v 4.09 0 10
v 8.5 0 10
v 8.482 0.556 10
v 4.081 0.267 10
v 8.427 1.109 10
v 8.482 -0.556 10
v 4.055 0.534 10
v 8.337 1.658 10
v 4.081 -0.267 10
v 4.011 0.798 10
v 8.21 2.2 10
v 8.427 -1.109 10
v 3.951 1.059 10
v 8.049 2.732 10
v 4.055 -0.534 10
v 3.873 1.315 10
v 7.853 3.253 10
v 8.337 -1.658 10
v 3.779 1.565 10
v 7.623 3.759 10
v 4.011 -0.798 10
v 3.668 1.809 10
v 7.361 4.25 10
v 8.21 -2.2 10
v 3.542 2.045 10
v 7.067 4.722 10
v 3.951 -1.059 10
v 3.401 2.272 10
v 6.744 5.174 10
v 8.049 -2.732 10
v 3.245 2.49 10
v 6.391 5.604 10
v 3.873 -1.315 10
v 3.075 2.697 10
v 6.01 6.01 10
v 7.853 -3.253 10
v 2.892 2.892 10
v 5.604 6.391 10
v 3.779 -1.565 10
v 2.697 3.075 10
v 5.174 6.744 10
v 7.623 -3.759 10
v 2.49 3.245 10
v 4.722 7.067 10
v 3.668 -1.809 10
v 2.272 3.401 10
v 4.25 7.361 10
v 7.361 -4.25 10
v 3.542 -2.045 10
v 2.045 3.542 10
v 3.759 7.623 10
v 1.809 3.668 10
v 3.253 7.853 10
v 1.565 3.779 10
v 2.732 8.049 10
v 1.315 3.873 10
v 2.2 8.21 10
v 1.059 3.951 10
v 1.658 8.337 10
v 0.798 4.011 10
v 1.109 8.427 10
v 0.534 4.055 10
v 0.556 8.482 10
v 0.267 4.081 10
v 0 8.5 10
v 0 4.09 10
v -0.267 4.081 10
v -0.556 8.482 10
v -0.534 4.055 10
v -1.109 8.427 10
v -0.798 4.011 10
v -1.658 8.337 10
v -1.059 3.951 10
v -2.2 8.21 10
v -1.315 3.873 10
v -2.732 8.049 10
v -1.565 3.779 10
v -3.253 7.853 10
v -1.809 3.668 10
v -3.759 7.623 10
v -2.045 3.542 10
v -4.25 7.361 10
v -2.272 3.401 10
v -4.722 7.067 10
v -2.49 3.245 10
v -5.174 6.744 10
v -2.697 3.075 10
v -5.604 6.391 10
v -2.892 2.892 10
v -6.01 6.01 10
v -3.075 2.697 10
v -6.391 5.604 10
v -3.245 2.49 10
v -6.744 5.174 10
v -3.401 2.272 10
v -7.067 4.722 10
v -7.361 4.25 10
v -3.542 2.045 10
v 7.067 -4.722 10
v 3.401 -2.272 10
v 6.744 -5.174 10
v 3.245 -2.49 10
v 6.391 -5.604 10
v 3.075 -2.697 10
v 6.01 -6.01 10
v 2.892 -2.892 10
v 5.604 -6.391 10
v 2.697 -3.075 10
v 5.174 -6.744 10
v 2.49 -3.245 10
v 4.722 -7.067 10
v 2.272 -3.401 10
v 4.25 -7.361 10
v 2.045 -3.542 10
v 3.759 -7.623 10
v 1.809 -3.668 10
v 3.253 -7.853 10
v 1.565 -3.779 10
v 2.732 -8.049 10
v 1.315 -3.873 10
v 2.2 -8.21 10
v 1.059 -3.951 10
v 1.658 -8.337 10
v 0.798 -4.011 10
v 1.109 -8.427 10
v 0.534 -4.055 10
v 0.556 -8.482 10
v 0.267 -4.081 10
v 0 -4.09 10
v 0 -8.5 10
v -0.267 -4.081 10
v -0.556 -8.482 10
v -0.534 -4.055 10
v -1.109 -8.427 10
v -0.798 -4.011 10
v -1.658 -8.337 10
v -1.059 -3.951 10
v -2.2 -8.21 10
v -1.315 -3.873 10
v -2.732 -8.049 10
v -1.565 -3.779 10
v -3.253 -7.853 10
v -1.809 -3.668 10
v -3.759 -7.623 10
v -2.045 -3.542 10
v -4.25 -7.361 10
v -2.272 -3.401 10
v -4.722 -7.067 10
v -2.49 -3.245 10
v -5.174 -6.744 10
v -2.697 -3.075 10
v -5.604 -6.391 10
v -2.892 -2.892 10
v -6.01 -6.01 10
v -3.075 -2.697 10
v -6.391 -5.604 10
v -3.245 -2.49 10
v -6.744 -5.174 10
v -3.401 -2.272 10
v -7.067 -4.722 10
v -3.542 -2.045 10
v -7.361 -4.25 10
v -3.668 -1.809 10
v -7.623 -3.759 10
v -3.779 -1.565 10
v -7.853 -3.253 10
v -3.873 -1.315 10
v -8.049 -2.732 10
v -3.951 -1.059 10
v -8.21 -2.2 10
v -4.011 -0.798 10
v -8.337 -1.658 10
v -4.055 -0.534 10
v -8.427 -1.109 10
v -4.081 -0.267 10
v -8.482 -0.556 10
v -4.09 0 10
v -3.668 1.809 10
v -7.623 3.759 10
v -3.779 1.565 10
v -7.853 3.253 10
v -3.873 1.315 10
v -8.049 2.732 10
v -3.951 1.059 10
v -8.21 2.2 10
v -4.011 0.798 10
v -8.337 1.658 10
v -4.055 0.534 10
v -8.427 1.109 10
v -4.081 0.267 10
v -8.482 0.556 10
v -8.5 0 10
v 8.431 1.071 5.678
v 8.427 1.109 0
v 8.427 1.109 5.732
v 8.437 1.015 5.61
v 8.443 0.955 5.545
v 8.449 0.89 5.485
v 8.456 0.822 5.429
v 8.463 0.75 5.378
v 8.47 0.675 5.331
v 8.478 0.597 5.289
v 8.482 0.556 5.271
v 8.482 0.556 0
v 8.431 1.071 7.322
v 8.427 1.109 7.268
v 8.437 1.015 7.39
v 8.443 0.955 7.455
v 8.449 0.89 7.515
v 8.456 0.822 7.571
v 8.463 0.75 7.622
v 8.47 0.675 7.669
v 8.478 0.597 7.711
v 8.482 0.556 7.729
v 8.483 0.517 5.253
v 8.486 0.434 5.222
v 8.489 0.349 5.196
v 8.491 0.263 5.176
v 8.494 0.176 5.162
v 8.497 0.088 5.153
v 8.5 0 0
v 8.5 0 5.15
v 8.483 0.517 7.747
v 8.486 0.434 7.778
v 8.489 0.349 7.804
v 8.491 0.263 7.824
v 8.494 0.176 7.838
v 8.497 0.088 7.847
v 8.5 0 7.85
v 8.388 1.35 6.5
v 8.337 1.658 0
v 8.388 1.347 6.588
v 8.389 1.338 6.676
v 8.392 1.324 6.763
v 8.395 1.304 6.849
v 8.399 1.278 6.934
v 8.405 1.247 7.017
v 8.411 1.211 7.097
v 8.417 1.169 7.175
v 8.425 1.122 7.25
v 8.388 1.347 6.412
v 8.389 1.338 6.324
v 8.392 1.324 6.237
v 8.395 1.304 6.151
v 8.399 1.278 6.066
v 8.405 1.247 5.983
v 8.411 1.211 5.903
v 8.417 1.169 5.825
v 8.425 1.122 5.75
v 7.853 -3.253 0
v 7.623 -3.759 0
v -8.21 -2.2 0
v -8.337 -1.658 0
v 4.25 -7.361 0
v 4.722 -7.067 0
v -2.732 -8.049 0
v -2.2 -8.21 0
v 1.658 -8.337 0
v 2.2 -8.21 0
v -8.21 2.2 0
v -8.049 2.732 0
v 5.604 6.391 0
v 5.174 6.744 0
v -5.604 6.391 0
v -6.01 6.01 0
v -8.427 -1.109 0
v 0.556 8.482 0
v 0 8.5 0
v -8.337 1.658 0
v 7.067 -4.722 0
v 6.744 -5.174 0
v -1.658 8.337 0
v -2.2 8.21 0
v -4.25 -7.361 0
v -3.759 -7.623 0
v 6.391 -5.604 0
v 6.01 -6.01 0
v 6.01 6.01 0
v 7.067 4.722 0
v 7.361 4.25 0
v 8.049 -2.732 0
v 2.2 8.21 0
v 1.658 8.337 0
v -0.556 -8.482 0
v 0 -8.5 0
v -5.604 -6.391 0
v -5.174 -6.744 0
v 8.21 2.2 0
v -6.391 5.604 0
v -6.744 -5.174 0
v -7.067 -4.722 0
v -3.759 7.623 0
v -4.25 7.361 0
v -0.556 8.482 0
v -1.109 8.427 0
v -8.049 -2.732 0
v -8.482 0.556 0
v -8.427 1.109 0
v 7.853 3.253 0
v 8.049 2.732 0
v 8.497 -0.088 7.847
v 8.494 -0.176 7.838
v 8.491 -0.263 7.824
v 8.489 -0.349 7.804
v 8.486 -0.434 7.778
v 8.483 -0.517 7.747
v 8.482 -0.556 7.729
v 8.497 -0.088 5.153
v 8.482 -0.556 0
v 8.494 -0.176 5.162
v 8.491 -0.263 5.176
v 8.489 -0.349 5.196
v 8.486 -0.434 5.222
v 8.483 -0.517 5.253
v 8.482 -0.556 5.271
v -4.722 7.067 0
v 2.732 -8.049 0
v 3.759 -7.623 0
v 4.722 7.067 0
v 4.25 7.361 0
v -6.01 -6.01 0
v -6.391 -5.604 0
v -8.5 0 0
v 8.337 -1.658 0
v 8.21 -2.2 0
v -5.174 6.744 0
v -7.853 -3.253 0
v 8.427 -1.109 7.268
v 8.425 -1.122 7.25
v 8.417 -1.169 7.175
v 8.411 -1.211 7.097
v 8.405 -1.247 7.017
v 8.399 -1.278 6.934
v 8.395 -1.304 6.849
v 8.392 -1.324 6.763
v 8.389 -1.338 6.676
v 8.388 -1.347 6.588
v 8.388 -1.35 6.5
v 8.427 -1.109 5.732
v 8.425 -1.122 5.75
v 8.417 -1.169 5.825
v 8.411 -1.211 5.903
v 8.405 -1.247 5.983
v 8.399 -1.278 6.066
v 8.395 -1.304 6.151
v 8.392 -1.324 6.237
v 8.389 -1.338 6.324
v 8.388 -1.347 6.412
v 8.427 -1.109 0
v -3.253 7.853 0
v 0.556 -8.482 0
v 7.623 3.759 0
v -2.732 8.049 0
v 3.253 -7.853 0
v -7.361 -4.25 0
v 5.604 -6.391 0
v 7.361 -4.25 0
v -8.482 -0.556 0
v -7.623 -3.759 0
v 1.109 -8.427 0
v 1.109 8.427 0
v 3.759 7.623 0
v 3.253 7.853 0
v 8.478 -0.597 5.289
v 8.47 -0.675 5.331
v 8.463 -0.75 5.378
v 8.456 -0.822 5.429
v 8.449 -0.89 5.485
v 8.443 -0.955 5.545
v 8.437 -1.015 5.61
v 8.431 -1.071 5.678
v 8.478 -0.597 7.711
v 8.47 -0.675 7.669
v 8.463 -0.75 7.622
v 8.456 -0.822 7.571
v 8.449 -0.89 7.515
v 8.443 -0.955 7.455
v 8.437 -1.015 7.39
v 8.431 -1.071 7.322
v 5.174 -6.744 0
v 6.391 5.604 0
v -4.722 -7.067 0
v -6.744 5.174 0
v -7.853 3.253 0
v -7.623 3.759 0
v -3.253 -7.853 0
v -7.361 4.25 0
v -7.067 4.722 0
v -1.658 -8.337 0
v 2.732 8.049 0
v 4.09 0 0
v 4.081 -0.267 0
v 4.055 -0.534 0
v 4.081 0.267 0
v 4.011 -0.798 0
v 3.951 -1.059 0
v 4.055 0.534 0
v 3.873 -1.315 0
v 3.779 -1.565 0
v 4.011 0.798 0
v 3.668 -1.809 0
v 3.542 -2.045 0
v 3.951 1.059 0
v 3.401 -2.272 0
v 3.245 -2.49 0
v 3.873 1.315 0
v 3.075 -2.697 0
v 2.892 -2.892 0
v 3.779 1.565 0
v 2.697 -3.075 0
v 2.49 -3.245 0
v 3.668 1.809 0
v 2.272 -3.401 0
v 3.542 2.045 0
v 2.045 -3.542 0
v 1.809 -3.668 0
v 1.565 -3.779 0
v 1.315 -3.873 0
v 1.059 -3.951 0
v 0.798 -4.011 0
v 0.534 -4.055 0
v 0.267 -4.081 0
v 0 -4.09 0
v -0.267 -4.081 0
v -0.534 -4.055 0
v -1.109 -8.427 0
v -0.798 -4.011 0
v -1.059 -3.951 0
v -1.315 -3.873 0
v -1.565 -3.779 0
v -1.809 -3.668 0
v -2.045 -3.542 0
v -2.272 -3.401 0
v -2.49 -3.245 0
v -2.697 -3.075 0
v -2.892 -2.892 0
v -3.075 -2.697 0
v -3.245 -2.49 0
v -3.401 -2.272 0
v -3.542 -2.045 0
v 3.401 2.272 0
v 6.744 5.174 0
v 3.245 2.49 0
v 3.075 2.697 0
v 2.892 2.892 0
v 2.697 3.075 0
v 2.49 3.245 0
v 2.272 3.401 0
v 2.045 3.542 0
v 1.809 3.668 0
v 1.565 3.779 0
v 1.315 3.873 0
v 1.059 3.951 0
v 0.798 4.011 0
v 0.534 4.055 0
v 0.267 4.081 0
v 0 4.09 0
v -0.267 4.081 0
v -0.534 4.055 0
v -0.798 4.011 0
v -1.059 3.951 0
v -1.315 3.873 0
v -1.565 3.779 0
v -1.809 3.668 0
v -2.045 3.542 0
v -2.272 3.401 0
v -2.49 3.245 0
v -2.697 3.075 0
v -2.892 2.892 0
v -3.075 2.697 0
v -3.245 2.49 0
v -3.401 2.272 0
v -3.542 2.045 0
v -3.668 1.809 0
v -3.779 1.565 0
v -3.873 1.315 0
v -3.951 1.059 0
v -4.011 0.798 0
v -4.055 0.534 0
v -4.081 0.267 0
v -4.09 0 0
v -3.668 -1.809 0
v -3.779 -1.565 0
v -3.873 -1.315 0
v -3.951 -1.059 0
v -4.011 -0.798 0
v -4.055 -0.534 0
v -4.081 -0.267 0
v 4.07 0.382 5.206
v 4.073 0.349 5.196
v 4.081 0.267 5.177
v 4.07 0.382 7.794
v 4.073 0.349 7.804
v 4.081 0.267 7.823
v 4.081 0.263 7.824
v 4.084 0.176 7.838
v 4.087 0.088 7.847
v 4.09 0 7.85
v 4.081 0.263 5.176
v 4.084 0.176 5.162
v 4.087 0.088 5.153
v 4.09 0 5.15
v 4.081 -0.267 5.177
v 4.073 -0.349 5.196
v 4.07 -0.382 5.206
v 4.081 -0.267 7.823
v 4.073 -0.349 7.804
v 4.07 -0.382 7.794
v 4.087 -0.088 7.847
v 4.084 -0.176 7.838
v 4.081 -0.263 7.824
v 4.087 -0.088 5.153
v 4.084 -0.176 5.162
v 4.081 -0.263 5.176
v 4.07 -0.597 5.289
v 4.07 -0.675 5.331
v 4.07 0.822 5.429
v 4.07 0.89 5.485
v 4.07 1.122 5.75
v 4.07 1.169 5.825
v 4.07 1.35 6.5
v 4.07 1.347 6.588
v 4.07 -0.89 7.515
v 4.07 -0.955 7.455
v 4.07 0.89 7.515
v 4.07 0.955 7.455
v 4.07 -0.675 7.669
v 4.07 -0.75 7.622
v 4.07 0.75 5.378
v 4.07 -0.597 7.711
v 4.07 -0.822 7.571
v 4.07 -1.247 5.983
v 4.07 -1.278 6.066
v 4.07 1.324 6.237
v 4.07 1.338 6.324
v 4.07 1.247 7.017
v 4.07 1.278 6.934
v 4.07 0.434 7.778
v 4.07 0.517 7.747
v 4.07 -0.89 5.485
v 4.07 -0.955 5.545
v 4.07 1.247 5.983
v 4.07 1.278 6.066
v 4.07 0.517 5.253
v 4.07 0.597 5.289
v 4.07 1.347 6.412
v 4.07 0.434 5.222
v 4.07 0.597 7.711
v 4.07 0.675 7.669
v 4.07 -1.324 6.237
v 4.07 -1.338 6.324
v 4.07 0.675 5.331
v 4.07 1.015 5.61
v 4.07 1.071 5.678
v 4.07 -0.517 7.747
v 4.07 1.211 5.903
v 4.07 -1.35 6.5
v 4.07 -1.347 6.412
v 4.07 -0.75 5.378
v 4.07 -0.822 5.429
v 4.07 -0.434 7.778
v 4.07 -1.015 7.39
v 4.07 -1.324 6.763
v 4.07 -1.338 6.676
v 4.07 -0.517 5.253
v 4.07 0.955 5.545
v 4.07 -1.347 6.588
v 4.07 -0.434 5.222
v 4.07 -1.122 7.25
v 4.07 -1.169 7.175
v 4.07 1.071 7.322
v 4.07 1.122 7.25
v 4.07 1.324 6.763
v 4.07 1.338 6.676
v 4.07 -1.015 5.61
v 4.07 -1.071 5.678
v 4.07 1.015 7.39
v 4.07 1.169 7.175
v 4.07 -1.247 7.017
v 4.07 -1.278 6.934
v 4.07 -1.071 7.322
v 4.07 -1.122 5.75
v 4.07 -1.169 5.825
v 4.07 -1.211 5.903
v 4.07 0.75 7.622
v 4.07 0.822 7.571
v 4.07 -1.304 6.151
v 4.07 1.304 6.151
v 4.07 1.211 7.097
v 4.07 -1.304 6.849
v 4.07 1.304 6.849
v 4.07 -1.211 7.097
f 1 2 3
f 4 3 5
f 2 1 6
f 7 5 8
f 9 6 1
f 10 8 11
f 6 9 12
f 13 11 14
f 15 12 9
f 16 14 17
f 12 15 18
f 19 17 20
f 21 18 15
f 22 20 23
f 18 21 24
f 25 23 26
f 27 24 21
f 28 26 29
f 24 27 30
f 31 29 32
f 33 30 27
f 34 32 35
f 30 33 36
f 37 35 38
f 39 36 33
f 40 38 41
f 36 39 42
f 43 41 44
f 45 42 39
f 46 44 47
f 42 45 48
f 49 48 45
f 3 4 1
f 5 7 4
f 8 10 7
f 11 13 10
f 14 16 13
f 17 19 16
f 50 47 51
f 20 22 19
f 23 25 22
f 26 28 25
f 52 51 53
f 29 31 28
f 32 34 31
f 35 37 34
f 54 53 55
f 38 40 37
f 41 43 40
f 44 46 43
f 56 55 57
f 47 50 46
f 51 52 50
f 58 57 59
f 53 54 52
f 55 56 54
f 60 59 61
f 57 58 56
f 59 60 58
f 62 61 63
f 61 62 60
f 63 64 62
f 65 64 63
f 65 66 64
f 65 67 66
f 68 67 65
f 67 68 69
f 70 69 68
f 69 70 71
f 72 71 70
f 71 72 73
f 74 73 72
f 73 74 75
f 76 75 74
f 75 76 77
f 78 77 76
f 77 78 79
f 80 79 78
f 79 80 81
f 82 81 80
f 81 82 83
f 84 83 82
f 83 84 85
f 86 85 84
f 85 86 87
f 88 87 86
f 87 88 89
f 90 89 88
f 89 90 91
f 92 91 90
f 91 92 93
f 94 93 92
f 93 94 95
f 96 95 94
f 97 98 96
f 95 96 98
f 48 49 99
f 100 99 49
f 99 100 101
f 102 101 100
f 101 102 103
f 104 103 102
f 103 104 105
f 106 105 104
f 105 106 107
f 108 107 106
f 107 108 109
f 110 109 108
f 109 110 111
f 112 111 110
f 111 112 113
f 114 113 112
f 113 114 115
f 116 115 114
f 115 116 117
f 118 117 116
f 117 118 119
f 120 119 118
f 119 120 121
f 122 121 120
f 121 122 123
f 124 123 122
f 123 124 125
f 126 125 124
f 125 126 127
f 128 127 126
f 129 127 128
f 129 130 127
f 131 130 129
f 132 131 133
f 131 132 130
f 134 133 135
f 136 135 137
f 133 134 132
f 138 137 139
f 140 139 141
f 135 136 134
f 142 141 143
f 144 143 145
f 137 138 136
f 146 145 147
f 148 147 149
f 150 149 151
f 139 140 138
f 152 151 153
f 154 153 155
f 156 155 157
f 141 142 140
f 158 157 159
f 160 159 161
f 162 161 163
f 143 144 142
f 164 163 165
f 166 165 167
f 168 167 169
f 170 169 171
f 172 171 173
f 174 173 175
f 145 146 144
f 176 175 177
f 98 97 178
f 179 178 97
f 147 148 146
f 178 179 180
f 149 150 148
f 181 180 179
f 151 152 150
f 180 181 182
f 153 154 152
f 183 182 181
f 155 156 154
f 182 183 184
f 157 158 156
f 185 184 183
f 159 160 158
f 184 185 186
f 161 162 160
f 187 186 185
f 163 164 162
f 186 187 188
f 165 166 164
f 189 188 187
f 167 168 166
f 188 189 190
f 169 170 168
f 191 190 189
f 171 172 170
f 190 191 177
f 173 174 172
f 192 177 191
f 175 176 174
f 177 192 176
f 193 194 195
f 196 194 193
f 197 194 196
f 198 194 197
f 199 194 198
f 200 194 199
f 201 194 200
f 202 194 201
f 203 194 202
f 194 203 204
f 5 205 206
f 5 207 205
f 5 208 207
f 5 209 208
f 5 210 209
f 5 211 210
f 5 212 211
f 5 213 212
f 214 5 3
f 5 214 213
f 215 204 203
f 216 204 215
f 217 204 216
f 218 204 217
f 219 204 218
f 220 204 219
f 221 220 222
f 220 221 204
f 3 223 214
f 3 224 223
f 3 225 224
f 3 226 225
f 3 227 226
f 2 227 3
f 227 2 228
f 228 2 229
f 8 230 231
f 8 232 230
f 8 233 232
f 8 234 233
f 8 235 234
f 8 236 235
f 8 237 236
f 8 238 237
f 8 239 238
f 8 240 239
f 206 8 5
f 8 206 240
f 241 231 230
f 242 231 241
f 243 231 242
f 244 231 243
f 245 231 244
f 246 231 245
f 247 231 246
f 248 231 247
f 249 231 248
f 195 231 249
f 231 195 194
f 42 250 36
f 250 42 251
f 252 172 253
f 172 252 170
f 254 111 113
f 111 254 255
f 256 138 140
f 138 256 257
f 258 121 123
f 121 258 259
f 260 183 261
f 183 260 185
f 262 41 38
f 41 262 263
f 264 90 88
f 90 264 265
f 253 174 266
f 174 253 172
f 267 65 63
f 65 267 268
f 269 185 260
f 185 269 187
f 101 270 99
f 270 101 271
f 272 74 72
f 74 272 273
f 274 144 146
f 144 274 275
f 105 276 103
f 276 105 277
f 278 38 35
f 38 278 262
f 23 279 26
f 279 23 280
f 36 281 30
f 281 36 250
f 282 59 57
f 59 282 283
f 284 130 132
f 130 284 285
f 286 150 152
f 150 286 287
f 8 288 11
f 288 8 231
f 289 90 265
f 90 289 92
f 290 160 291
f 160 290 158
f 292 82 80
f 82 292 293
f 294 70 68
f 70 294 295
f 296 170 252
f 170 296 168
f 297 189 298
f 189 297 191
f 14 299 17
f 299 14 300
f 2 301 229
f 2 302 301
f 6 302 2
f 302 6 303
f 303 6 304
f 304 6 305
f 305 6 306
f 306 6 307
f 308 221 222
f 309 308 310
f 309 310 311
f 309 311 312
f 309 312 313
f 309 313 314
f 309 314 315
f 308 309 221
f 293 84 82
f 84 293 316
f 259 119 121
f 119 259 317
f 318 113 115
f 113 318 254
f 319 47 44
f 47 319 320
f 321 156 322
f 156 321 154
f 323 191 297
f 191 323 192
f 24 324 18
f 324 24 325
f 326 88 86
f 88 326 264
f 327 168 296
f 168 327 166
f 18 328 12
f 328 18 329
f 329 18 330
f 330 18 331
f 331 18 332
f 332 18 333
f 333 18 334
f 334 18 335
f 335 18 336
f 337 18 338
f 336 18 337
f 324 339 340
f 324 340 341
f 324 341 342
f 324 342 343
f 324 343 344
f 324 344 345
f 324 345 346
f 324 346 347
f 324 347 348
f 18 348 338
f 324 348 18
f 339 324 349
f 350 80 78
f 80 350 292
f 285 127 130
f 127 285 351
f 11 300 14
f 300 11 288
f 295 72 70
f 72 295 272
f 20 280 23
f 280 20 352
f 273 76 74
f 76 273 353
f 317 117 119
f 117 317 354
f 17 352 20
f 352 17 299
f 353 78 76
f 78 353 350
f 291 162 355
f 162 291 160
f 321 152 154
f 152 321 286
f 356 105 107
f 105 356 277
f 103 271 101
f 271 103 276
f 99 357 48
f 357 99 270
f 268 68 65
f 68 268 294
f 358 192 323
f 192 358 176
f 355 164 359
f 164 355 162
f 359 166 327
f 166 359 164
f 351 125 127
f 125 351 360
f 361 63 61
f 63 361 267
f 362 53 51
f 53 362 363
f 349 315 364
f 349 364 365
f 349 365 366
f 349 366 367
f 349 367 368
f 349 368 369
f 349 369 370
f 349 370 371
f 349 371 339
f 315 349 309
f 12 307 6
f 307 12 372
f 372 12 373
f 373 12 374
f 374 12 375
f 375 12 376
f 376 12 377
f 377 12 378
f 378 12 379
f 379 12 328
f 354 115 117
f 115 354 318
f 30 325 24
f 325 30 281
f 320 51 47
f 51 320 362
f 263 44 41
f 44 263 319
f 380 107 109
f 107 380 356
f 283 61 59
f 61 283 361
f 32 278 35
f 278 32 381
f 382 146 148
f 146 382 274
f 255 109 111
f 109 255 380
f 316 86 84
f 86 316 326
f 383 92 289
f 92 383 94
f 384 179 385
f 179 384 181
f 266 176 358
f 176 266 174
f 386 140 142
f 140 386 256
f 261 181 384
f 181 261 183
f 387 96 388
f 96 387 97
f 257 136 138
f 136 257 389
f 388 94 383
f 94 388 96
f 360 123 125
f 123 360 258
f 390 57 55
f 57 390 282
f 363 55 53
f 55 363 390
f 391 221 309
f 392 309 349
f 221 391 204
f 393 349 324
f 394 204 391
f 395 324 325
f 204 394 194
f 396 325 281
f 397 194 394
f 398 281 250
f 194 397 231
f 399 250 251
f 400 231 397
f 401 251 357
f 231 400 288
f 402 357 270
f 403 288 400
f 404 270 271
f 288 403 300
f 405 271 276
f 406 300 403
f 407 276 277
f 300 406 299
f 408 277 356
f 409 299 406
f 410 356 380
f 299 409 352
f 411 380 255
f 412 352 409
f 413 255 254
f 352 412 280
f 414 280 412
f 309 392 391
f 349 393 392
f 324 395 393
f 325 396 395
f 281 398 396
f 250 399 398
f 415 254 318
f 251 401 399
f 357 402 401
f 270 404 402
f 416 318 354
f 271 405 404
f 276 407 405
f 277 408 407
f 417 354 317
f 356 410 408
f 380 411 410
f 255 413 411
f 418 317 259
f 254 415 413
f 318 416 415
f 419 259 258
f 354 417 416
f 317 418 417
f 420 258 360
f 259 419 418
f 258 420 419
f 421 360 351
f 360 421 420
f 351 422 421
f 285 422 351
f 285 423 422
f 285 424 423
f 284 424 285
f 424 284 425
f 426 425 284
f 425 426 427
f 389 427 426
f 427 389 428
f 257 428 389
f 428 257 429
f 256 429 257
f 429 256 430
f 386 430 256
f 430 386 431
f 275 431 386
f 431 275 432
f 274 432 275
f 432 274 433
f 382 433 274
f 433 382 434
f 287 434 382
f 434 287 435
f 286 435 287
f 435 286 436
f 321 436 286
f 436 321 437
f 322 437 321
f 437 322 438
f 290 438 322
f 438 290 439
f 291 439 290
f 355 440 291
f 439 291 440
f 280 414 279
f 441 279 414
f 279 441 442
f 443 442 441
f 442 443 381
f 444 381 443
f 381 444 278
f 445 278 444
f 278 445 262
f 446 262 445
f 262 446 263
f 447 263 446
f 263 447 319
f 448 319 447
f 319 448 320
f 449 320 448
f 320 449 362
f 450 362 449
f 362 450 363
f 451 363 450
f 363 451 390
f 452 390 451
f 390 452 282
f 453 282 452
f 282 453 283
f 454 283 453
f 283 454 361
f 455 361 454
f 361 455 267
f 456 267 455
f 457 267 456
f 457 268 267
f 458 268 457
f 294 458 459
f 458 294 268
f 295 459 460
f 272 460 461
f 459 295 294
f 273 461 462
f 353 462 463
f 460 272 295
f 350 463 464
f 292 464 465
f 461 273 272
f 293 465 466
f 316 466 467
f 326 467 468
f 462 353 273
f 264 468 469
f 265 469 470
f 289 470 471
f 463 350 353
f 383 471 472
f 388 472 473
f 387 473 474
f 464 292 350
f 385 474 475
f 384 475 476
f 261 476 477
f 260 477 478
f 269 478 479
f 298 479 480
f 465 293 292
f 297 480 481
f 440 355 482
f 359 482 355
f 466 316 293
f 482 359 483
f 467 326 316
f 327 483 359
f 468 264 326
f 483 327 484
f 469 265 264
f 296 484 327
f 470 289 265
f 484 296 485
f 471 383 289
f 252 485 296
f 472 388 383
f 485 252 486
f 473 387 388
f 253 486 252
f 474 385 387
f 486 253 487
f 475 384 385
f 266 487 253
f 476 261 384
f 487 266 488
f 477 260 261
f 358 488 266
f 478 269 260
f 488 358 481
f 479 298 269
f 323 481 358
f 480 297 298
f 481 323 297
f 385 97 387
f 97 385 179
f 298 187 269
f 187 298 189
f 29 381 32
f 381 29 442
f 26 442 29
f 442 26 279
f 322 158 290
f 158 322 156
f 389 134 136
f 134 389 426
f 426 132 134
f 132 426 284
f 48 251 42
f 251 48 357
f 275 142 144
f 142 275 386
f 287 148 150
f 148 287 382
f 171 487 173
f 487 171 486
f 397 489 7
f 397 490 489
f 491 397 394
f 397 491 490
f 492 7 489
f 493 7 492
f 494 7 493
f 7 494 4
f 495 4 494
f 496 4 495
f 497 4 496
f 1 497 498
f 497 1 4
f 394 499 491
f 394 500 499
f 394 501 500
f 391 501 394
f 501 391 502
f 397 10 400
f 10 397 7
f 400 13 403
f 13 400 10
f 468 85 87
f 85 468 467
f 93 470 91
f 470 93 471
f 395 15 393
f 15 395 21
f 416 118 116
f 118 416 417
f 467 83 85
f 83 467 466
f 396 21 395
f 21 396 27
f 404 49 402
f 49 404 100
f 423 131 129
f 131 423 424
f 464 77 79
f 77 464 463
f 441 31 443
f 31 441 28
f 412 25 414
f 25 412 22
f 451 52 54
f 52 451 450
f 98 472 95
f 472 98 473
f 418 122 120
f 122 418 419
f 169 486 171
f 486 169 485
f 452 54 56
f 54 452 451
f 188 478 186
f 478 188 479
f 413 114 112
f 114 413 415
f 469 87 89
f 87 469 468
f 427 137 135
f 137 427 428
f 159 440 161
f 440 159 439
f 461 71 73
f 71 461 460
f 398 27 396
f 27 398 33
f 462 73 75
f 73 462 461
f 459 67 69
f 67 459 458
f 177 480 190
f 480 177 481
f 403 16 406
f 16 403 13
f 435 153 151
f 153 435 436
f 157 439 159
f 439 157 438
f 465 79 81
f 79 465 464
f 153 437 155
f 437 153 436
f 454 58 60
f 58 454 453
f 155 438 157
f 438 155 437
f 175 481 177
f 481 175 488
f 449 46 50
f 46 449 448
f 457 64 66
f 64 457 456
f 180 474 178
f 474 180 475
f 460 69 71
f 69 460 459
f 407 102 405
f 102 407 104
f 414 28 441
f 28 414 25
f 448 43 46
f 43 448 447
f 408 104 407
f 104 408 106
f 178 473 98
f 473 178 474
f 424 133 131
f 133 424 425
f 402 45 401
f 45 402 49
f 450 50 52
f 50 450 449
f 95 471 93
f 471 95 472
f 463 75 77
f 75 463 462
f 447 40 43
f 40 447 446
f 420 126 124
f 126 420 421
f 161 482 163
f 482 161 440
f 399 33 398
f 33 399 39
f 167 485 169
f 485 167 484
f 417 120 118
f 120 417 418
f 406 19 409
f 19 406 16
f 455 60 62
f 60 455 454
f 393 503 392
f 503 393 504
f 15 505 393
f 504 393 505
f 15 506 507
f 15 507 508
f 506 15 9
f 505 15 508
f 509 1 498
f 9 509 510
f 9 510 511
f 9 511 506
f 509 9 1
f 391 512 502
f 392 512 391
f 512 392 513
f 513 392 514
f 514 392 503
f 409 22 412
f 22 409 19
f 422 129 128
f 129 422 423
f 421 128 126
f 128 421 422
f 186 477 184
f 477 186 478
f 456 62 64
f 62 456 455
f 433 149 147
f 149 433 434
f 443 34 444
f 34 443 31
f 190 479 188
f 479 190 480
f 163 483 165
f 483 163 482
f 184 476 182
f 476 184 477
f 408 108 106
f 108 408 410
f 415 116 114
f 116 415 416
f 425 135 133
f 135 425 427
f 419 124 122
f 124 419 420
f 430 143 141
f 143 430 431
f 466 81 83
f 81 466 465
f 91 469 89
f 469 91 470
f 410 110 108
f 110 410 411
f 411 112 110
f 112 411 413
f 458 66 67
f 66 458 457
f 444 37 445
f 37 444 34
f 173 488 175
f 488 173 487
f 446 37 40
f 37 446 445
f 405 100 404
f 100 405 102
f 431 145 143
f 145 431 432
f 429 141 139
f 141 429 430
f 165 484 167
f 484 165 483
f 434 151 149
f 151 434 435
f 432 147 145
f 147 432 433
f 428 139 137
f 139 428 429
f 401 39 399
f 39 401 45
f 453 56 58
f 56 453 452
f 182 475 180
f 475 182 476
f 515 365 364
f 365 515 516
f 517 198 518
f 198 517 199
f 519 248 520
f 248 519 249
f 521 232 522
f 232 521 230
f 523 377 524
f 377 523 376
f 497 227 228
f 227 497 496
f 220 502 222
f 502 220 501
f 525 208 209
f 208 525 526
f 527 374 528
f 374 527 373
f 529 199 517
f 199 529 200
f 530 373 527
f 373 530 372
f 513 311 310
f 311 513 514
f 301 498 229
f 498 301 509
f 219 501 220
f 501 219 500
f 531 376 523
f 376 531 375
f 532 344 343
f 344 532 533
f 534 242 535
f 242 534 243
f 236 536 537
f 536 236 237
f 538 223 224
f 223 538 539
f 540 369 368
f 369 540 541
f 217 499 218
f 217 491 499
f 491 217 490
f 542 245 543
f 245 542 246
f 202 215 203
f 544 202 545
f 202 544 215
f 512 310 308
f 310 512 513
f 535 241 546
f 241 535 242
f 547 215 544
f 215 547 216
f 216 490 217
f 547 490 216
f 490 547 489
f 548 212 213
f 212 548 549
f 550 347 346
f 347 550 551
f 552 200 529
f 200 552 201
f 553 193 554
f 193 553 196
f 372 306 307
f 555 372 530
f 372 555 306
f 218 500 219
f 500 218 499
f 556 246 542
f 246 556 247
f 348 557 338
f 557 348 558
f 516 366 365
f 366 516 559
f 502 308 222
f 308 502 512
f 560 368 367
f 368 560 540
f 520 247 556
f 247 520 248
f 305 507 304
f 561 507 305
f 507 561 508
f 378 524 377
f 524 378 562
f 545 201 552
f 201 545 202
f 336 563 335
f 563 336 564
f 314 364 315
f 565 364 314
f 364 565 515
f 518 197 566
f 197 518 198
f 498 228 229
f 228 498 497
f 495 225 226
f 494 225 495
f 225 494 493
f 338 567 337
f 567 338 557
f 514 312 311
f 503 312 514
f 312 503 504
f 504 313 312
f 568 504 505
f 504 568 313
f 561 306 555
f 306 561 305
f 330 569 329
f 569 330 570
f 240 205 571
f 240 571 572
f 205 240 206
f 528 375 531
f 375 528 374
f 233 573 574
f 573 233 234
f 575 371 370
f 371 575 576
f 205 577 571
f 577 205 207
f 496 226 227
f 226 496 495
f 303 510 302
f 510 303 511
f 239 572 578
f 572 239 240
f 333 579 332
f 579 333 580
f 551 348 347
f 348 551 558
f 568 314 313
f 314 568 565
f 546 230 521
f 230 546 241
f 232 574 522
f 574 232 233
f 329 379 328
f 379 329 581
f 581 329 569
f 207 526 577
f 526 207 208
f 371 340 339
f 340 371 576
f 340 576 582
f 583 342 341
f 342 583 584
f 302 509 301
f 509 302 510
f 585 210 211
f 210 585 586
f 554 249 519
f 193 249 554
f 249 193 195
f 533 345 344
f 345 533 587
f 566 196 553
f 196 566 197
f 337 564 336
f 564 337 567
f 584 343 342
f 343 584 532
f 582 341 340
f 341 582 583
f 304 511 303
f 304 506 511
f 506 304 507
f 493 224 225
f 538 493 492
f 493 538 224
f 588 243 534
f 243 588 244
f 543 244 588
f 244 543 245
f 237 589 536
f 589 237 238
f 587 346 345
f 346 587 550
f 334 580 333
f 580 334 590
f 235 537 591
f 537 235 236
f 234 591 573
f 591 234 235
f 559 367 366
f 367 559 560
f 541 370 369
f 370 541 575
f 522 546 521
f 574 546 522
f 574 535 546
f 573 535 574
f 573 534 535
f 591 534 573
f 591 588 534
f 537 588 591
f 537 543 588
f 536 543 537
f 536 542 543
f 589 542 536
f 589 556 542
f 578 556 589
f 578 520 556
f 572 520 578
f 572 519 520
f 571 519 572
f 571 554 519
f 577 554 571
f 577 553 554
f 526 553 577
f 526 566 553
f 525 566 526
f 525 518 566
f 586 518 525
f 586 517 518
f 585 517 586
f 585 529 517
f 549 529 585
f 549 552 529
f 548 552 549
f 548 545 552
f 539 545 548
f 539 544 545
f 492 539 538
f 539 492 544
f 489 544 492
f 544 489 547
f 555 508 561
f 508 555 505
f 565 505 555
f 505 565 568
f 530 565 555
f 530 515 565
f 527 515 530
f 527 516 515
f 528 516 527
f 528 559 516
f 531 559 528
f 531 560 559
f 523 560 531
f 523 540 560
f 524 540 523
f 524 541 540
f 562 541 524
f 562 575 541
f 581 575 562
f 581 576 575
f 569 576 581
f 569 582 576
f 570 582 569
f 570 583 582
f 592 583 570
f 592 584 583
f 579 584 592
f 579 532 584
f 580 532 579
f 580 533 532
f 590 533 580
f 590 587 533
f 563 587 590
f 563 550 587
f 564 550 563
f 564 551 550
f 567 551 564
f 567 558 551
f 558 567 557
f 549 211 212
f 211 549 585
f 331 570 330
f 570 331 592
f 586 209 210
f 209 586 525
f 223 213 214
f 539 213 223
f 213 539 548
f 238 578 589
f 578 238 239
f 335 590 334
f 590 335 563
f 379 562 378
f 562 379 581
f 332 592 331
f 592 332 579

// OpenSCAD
// file: ../config.scad
// Global configuration for the printable 28BYJ-48 Alt-Az mount.
// Units: millimetres, degrees.

$fn = $preview ? 48 : 96;
EPS = 0.02;

FIT = 0.25;
PRESS_FIT = 0.10;
ELEPHANT_FOOT = 0.25;
MIN_WALL = 2.4;

// 28BYJ-48 mechanical envelope. Clone dimensions vary: verify yours.
BYJ_BODY_D = 28.0;
BYJ_BODY_H = 19.0;
BYJ_FLANGE_T = 1.5;
BYJ_BOSS_D = 9.0;
BYJ_BOSS_H = 2.5;
BYJ_SHAFT_D = 5.0;
BYJ_SHAFT_FLAT = 3.0;
BYJ_SHAFT_L = 10.0;
BYJ_MOUNT_SPACING = 35.0;
BYJ_MOUNT_HOLE_D = 4.0;
BYJ_SHAFT_TO_HOLE_LINE = 8.0;
BYJ_BODY_CENTER_FROM_SHAFT = [0, -11.0];
BYJ_CABLE_BOX = [14.6, 8.0, 11.0];

// Additional reducer: 12 -> 48 and 12 -> 60 = 20:1.
GEAR_MODULE = 1.0;
GEAR_PRESSURE_ANGLE = 20;
GEAR_BACKLASH = 0.12;
GEAR_CLEARANCE = 0.25;
GEAR_Z1 = 12;
GEAR_Z2 = 48;
GEAR_Z3 = 12;
GEAR_Z4 = 60;
GEAR_FACE = 5.0;
GEAR_GAP = 1.0;
GEAR_STACK_H = GEAR_FACE * 2 + GEAR_GAP;
GEAR_RATIO = (GEAR_Z2 / GEAR_Z1) * (GEAR_Z4 / GEAR_Z3);
CD_STAGE1 = GEAR_MODULE * (GEAR_Z1 + GEAR_Z2) / 2;
CD_STAGE2 = GEAR_MODULE * (GEAR_Z3 + GEAR_Z4) / 2;

REDUCER_OUTPUT = [0, 0];
REDUCER_INTERMEDIATE = [CD_STAGE2, 0];
REDUCER_MOTOR = [CD_STAGE2, CD_STAGE1];
REDUCER_MOTOR_ROT = 130;
INTERMEDIATE_AXLE_D = 3.2;

BEARING_608_ID = 8.0;
BEARING_608_OD = 22.0;
BEARING_608_W = 7.0;
AXIS_SHAFT_D = 8.0;
AXIS_CLEARANCE_D = 8.3;
M3_CLEARANCE_D = 3.3;
M4_CLEARANCE_D = 4.4;
M5_CLEARANCE_D = 5.5;
M8_CLEARANCE_D = 8.6;

TRIPOD_THREAD_D = 6.35;
TRIPOD_CLEARANCE_D = 6.8;
TRIPOD_NUT_AF = 11.2;
TRIPOD_NUT_H = 5.8;

// Azimuth base, gearbox cover and turntable.
AZ_BASE_D = 132.0;
AZ_COVER_BOLT_R = 59.0;
AZ_BASE_PLATE_H = 3.0;
AZ_PEDESTAL_H = 24.0;
AZ_PEDESTAL_D = 48.0;
AZ_COVER_H = 16.0;
AZ_COVER_WALL = 3.0;
AZ_COVER_TOP_T = 3.0;
AZ_TURNTABLE_D = 120.0;
AZ_TURNTABLE_H = 9.0;
AZ_GLIDE_RADIUS = 43.0;
AZ_GLIDE_D = 8.0;
AZ_GLIDE_GAP = 1.0;
AZ_COVER_CLEARANCE = 0.8;
AZ_OUTPUT_SPACER_H = 5.0;
AZ_OUTPUT_PASSAGE_D = 32.0;
AZ_OUTPUT_LOCATOR_D = 30.0;
AZ_OUTPUT_LOCATOR_DEPTH = 2.0;
AZ_OUTPUT_BOLT_R = 11.5;
AZ_AXIS_NUT_RECESS_D = 17.0;
AZ_AXIS_NUT_RECESS_H = 4.0;
AZ_YOKE_MOUNT_X = 36.0;
AZ_YOKE_MOUNT_Y = 10.0;
AZ_YOKE_NUT_DEPTH = 3.5;

// Azimuth 20:1 printed reducer axial stack and interfaces.
AZ_GEAR_Z0 = 1.0;
AZ_UPPER_GEAR_Z = AZ_GEAR_Z0 + GEAR_FACE + GEAR_GAP;
AZ_GEAR_TOP_CLEARANCE = AZ_COVER_H - AZ_COVER_TOP_T - (AZ_UPPER_GEAR_Z + GEAR_FACE);
AZ_MOTOR_PINION_HUB_D = 10.8;
AZ_MOTOR_PINION_HUB_H = 7.0;
AZ_COMPOUND_HUB_D = 10.0;
AZ_INTERMEDIATE_BORE_D = 3.35;
AZ_OUTPUT_HUB_D = 29.6;
AZ_OUTPUT_HUB_H = AZ_COVER_H + AZ_GLIDE_GAP + AZ_OUTPUT_LOCATOR_DEPTH - AZ_UPPER_GEAR_Z;
AZ_OUTPUT_NUT_DEPTH = 2.8;

YOKE_AXIS_Z = 96.0;
YOKE_INNER_W = 92.0;
YOKE_ARM_T = 8.0;
YOKE_ARM_W = 34.0;
YOKE_OUTER_W = YOKE_INNER_W + 2 * YOKE_ARM_T;
YOKE_FOOT_LEN = 42.0;
YOKE_FOOT_W = 30.0;
YOKE_ARM_CENTER_X = YOKE_INNER_W / 2 + YOKE_ARM_T / 2;
YOKE_TENON_LEN = 28.0;
YOKE_BRIDGE_X = 112.0;
YOKE_BRIDGE_Y = 36.0;
YOKE_BRIDGE_H = 12.0;
YOKE_SLOT_DEPTH = 9.0;
YOKE_SLOT_CLEARANCE = 0.35;
YOKE_LOCK_LOCAL_Y = 3.0;
YOKE_BEARING_POCKET_DEPTH = 7.2;
YOKE_DRIVE_BOSS_D = 54.0;
YOKE_IDLER_BOSS_D = 44.0;
YOKE_GEARBOX_BOLT_R = 18.0;
ALT_GEARBOX_GAP = 14.0;
ALT_BACKPLATE_H = 3.2;
ALT_SHAFT_L = YOKE_OUTER_W + ALT_GEARBOX_GAP + 28.0;

PAYLOAD_PLATE = [80.0, 112.0, 6.0];
PAYLOAD_SLOT_L = 48.0;
PAYLOAD_SLOT_D = TRIPOD_CLEARANCE_D;
SHAFT_CLAMP_W = 18.0;
SHAFT_CLAMP_L = 30.0;
SHAFT_CLAMP_H = 10.0;

BYJ_NOMINAL_HALFSTEPS_PER_OUTPUT_REV = 4096;
AXIS_NOMINAL_STEPS_PER_REV = BYJ_NOMINAL_HALFSTEPS_PER_OUTPUT_REV * GEAR_RATIO;
// main file
include <../config.scad>

module shaft_collar_8mm() {
    collar_d = 17.0;
    collar_h = 10.0;
    bore_d = AXIS_SHAFT_D + 0.18;
    pilot_d = 2.7; // drill/tap M3 after printing
    pilot_z = 6.5;
    pilot_len = collar_d / 2 - bore_d / 2 + 2 * EPS;

    difference() {
        cylinder(d = collar_d, h = collar_h);
        translate([0, 0, -EPS])
            cylinder(d = bore_d, h = collar_h + 2 * EPS);

        // Blind radial M3 pilot runs only from the OD to the shaft bore.
        // An M3 grub screw presses directly on the steel shaft.
        translate([bore_d / 2 - EPS, 0, pilot_z])
            rotate([0, 90, 0])
                cylinder(d = pilot_d, h = pilot_len);
    }
}

shaft_collar_8mm();
